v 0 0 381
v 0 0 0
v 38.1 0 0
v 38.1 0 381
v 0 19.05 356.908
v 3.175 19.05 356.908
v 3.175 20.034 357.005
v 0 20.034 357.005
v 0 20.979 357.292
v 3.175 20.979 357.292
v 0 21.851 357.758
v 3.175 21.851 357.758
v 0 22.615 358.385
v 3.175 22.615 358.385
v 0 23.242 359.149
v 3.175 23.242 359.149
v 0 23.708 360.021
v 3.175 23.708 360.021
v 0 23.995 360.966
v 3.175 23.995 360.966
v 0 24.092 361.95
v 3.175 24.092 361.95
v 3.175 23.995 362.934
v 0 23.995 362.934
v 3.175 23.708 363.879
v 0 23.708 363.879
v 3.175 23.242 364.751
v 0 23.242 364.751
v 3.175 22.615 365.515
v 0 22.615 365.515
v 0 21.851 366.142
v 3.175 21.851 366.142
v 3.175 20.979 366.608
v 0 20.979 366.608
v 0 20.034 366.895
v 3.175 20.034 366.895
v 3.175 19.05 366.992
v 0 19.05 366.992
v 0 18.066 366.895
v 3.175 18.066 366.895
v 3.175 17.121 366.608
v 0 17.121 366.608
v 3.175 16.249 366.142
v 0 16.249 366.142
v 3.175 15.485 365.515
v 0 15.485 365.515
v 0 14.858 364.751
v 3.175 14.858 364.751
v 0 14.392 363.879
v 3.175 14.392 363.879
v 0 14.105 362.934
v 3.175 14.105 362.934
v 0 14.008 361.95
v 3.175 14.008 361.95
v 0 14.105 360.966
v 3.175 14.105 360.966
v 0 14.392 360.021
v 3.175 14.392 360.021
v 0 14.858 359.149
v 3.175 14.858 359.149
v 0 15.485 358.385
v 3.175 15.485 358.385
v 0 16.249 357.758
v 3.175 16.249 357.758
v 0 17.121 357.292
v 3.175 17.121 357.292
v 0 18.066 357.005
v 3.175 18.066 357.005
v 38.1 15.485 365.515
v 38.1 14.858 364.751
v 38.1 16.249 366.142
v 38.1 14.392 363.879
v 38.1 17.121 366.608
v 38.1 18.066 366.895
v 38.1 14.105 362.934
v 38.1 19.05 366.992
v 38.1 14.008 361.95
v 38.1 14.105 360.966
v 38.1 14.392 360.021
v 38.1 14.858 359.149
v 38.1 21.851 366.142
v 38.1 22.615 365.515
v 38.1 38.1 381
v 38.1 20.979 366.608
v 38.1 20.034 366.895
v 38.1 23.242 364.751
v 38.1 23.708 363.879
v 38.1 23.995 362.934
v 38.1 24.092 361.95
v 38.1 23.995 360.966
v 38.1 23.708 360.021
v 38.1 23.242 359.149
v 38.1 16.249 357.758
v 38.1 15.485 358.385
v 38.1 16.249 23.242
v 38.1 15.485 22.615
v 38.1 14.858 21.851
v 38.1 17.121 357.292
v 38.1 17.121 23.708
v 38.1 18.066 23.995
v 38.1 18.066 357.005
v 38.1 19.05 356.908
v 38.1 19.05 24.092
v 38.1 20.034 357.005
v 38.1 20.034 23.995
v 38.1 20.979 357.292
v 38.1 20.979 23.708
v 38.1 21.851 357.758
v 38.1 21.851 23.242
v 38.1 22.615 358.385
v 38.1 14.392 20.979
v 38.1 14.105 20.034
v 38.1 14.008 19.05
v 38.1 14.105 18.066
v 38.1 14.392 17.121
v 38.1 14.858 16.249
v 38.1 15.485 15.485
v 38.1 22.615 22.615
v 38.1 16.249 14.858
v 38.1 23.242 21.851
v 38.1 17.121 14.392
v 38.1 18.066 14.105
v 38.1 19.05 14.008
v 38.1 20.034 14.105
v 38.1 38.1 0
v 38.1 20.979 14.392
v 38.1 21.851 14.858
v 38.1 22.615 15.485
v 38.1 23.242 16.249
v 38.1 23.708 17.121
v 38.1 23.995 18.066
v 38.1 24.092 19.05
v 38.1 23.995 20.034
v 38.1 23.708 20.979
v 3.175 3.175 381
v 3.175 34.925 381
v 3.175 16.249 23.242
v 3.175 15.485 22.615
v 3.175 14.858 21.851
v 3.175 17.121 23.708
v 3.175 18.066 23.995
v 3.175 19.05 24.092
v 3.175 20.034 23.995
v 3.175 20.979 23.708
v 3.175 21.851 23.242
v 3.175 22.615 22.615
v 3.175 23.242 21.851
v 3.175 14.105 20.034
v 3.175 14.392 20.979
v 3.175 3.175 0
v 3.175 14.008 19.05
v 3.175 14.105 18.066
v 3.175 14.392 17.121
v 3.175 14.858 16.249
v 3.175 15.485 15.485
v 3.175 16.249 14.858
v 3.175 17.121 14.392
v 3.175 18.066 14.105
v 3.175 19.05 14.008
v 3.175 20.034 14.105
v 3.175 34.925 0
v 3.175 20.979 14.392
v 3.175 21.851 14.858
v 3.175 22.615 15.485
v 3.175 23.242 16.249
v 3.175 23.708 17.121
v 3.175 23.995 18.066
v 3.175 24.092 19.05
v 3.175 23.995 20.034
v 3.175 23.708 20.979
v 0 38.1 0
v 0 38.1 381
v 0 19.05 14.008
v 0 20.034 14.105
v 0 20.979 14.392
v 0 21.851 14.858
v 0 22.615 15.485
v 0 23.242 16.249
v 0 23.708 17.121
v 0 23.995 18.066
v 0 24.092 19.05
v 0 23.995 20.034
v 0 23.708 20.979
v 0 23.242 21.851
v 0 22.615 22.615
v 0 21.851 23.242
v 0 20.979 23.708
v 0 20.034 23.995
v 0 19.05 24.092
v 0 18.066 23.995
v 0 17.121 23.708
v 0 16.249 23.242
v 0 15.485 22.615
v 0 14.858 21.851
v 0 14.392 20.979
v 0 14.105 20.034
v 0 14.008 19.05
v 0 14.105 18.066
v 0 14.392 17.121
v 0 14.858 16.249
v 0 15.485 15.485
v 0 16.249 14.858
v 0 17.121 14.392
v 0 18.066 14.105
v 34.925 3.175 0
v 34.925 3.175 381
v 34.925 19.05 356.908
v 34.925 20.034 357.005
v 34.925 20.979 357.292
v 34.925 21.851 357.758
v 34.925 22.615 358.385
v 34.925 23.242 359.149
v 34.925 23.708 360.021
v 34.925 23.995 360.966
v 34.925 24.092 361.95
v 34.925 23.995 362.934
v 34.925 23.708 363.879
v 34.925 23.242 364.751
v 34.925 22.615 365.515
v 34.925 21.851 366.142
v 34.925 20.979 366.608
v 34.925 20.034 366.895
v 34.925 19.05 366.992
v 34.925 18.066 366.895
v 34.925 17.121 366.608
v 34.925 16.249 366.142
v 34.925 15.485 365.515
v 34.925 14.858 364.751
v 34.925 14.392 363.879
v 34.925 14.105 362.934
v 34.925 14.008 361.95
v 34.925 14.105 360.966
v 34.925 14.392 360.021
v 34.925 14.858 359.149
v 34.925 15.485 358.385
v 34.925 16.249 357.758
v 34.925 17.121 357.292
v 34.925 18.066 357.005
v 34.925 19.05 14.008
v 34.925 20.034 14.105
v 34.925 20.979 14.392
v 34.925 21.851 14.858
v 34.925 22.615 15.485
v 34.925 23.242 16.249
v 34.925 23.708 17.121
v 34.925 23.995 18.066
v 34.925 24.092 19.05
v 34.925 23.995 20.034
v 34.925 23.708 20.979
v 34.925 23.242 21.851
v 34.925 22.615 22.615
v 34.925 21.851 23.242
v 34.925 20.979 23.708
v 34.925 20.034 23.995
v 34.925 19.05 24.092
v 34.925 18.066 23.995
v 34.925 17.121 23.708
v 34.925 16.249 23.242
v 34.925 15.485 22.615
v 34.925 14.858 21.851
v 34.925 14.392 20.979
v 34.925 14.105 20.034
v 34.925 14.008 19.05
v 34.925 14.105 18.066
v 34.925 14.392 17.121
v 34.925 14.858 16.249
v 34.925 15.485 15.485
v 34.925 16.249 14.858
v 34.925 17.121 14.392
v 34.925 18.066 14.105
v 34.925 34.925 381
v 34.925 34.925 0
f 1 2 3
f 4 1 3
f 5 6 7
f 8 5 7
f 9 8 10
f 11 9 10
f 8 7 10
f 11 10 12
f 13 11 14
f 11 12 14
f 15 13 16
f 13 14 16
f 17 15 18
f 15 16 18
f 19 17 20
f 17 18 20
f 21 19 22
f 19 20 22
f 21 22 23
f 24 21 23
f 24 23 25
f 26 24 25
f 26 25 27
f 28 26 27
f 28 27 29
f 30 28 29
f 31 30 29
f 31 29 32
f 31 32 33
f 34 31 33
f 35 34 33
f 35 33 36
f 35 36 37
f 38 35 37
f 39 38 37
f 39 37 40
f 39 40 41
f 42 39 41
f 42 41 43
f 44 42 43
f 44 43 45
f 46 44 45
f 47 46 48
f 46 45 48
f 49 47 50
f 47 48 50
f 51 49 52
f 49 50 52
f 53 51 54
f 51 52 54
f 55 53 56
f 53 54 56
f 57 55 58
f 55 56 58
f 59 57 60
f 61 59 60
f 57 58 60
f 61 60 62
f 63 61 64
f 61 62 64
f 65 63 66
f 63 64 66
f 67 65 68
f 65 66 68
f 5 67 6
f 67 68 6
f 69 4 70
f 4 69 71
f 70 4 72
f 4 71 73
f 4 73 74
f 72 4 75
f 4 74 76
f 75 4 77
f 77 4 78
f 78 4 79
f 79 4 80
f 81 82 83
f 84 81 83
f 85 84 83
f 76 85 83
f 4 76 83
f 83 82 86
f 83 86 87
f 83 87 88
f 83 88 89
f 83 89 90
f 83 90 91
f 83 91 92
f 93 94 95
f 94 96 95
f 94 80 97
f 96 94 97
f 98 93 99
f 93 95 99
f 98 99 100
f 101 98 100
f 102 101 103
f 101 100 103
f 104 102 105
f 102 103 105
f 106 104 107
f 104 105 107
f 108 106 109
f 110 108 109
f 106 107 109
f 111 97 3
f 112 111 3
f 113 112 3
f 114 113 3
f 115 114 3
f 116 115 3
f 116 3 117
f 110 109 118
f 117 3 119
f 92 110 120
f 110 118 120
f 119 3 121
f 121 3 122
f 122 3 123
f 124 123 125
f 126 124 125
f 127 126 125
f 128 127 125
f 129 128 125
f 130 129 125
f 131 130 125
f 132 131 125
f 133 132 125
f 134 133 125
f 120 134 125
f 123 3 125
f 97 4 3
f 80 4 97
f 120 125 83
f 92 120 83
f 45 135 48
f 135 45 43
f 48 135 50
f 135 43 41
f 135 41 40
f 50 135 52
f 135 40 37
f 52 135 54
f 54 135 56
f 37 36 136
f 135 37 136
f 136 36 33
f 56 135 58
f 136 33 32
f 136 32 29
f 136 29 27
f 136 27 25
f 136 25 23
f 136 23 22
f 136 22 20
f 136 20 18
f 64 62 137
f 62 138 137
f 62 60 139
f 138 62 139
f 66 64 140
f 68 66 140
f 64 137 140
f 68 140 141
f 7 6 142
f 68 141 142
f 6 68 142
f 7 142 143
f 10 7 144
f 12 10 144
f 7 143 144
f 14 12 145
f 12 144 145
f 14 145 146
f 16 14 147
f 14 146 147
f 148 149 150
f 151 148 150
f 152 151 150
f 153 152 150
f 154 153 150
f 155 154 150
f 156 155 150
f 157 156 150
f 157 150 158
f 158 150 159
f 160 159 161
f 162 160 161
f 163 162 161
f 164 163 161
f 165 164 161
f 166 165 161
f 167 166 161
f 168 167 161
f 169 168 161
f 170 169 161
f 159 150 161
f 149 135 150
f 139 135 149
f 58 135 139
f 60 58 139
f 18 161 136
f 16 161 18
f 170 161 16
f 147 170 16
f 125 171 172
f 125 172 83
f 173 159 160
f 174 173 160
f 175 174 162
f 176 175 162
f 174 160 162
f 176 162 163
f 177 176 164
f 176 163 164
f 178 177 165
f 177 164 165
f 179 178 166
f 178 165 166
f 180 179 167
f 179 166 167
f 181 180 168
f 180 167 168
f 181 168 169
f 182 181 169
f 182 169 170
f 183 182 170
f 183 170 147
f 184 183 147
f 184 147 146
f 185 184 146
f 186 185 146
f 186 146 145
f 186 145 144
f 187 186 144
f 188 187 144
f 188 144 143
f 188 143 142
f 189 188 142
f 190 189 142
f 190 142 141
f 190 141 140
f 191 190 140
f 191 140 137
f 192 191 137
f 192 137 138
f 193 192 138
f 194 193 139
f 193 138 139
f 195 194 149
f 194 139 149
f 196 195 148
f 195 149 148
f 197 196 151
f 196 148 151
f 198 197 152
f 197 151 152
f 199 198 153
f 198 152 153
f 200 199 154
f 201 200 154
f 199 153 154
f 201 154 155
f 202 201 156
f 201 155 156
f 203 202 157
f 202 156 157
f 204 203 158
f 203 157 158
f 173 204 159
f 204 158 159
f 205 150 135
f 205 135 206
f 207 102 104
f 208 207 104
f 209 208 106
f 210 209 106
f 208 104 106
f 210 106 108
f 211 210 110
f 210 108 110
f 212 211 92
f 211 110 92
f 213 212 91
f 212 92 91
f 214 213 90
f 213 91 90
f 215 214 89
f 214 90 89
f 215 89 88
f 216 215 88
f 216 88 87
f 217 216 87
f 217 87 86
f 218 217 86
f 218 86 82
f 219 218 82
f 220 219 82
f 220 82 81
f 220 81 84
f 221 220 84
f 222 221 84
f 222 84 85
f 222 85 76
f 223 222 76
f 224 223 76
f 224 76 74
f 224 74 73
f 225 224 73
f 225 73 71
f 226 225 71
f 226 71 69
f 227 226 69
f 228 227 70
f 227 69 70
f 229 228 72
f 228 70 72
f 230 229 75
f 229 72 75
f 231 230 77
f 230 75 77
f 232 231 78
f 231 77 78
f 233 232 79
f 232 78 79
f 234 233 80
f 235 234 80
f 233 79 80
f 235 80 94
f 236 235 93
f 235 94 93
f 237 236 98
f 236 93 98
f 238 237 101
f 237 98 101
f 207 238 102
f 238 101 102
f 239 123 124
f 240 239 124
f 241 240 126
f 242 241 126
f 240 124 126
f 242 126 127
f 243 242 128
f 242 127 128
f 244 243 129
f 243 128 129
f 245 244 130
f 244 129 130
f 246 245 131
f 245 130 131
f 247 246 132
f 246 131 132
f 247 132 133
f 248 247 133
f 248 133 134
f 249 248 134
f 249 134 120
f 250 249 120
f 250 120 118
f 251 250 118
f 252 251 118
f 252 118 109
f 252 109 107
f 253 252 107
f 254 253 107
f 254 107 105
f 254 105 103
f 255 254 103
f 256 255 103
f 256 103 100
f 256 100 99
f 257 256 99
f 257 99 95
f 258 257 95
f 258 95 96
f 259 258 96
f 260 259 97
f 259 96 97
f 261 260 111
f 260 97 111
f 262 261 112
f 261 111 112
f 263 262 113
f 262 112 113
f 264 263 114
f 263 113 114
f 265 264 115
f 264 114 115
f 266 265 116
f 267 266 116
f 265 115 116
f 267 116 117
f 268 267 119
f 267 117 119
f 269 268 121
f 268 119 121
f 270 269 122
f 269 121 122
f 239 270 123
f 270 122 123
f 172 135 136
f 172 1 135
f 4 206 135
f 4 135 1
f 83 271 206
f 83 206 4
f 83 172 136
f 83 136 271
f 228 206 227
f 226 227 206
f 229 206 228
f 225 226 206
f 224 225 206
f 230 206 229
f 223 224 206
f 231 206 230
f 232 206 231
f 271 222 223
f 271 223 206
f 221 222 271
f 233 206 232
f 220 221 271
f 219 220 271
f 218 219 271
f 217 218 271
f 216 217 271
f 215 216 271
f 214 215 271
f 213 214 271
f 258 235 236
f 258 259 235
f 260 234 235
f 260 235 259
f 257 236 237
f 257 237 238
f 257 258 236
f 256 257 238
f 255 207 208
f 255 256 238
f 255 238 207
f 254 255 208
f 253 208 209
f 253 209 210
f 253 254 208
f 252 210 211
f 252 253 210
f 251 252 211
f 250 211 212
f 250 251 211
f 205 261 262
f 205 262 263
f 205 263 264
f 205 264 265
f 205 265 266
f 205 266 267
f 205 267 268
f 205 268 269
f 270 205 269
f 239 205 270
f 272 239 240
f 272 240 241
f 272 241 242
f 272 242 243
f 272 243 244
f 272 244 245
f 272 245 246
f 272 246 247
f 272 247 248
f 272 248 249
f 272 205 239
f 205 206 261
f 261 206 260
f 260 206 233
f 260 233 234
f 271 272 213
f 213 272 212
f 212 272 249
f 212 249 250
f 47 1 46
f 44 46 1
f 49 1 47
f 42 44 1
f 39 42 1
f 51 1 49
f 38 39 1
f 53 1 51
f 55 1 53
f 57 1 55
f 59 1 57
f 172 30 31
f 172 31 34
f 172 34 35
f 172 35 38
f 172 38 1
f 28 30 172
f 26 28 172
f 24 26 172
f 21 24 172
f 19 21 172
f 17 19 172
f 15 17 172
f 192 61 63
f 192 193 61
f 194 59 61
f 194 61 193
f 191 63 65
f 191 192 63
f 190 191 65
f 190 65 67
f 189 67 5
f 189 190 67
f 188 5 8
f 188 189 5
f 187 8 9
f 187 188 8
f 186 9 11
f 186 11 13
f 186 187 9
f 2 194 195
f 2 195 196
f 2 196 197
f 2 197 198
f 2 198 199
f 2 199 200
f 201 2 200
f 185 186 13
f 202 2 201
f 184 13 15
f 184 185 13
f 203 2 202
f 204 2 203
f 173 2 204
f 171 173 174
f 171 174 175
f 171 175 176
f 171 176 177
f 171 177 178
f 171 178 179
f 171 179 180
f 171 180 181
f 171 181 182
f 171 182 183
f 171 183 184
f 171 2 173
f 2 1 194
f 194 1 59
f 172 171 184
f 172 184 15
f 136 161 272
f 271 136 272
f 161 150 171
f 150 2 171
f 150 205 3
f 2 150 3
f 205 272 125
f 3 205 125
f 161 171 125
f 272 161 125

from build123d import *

# Parameters (mm, degrees)
SKETCH2_W                = 38.1
SKETCH2_H                = 38.1
SKETCH2_W_2              = 31.75
SKETCH2_H_2              = 31.75
BOSS_EXTRUDE1_DEPTH      = 381
X_0_397_DIAMETER_HOLE1_D = 10.0838


with BuildPart() as part:
    # Sketch2 → Boss-Extrude1 (new body)
    with BuildSketch(Plane.XY):
        with Locations((19.05, 19.05)):
            Rectangle(SKETCH2_W, SKETCH2_H)
        with Locations((19.05, 19.05)):
            Rectangle(SKETCH2_W_2, SKETCH2_H_2, mode=Mode.SUBTRACT)
    extrude(amount=BOSS_EXTRUDE1_DEPTH)

    # X (0.397) Diameter Hole1 (through all)
    with Locations(Plane.ZY):
        with Locations((19.05, 19.05), (361.95, 19.05)):
            Hole(X_0_397_DIAMETER_HOLE1_D / 2)


solid = part.part
